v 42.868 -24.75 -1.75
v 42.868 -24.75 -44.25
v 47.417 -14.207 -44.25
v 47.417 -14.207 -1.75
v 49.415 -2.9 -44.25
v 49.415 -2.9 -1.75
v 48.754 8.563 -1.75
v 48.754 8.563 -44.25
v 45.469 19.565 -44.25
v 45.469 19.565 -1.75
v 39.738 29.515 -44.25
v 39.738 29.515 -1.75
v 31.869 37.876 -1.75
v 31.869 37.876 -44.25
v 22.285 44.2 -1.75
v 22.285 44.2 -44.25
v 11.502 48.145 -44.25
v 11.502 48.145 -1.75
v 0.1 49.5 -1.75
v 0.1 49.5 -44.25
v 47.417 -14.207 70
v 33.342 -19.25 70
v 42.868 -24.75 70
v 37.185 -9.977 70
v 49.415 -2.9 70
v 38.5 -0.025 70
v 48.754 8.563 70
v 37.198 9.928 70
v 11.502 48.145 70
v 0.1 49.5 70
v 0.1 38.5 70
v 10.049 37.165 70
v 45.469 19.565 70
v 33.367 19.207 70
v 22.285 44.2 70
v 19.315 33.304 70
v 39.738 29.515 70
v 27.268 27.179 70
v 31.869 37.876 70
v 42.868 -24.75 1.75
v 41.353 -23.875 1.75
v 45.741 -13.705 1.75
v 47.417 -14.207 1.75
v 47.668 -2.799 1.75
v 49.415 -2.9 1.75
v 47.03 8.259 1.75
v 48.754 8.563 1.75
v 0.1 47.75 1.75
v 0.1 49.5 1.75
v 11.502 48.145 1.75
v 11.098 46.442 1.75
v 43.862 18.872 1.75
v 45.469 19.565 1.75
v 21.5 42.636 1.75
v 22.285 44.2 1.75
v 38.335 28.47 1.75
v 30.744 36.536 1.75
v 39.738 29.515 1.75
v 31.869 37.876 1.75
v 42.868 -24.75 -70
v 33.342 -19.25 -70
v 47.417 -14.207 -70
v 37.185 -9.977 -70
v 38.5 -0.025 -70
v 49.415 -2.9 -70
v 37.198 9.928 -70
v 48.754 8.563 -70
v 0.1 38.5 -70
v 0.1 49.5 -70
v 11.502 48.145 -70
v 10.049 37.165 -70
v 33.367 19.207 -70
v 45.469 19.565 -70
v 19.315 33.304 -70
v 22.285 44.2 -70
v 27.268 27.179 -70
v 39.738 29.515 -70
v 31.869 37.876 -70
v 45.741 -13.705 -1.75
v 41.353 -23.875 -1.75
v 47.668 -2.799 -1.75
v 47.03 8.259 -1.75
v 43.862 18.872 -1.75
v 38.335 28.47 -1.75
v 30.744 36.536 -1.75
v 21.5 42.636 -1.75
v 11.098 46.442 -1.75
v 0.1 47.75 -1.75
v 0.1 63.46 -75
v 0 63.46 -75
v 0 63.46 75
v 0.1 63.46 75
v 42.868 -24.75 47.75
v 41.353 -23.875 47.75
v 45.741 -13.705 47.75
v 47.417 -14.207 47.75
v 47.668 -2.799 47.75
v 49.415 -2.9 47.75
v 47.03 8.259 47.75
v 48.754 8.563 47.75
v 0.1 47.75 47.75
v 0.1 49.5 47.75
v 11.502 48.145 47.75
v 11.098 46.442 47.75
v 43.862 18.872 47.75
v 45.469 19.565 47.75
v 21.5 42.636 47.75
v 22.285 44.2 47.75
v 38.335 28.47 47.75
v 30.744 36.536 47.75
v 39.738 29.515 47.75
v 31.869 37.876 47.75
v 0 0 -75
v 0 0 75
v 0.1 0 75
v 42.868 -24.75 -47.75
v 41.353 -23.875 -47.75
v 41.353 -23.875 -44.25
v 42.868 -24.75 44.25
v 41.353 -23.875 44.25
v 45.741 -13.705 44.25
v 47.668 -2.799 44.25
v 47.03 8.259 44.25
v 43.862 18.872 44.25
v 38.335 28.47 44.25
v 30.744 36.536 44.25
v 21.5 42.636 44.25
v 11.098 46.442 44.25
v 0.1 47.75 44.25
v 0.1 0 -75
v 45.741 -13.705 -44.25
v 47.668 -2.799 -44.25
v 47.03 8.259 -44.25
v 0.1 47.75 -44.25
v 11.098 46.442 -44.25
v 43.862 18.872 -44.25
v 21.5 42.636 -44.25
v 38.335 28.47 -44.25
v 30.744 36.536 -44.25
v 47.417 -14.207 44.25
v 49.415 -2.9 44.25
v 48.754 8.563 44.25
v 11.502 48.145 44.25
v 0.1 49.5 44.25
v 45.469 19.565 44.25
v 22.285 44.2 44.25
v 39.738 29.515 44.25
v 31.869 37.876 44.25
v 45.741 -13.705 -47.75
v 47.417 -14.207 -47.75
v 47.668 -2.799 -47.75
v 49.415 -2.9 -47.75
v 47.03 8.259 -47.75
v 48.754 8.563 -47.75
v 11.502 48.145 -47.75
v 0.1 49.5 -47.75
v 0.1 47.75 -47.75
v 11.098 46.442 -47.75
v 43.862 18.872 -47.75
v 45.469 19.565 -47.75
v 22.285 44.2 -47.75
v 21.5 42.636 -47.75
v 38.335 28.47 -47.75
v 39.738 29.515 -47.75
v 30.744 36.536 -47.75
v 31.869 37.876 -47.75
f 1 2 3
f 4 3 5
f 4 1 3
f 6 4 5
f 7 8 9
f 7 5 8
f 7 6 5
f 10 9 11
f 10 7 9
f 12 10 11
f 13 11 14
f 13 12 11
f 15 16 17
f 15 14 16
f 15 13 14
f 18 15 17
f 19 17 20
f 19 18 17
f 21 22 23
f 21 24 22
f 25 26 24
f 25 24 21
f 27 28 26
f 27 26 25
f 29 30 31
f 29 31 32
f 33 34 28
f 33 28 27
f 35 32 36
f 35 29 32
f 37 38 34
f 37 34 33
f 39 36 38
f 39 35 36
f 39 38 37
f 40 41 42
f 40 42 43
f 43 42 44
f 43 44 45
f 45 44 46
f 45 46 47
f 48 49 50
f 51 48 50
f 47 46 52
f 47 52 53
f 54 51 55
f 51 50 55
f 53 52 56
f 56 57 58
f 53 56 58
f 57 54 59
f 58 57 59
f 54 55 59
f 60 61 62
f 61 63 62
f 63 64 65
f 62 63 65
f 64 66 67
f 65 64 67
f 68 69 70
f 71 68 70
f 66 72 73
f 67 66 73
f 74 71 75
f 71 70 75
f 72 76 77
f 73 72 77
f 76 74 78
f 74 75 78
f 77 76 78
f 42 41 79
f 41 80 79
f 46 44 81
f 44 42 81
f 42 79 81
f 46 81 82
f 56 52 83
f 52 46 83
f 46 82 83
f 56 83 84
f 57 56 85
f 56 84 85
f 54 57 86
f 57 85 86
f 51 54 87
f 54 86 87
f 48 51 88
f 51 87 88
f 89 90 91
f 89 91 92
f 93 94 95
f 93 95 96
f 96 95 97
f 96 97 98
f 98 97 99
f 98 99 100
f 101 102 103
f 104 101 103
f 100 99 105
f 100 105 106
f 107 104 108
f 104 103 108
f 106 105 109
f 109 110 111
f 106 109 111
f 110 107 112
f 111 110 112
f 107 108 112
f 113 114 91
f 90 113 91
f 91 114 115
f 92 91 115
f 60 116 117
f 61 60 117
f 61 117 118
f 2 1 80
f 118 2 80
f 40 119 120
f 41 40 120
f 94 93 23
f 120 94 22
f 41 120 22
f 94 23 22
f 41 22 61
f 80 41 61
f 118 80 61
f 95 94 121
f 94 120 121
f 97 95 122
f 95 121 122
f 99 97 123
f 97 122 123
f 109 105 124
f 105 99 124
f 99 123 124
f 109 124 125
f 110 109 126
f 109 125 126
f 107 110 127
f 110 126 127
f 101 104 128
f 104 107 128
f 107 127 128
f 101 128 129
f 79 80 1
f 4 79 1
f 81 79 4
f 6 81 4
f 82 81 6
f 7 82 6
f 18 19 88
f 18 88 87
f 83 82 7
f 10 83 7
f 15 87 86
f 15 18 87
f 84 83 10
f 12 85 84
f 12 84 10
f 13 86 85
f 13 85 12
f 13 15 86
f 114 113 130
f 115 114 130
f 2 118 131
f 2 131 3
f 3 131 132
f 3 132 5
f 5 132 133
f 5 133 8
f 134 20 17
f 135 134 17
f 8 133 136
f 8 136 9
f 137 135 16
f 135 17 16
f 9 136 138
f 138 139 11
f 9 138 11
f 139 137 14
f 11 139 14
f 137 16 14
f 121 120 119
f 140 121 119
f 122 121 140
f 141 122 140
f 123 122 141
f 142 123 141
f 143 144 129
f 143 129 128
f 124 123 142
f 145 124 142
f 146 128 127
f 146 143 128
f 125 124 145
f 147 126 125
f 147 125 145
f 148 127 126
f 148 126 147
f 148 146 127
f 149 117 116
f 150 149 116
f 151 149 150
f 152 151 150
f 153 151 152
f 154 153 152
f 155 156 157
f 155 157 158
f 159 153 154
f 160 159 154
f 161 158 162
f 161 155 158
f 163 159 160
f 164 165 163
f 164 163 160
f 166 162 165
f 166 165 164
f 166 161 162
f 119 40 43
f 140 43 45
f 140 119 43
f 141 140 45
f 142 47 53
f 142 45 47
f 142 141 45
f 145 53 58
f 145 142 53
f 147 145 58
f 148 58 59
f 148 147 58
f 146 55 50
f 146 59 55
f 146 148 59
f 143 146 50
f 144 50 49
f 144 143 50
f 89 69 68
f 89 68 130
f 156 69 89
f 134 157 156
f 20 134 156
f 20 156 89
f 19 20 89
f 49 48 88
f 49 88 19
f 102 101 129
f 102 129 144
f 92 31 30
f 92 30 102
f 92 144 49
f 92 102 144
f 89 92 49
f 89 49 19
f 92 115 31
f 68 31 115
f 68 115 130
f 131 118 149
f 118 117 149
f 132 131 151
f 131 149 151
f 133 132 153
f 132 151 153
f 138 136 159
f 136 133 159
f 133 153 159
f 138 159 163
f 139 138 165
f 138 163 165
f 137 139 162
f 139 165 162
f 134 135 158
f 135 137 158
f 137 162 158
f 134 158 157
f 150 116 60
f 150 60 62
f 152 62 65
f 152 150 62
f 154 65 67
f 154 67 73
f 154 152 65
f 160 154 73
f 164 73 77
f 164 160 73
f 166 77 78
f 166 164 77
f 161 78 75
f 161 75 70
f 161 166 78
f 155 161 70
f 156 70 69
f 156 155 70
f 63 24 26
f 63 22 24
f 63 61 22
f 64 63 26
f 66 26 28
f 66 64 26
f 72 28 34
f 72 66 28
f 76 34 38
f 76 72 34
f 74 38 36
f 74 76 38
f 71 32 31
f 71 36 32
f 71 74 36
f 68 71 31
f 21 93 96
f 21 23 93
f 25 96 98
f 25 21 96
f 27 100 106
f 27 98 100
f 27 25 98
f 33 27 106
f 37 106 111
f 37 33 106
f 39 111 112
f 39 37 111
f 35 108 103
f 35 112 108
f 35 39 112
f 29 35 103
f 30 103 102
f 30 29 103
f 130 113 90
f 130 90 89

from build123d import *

# Parameters (mm, degrees)
F0_R       = 49.5
F0_R_2     = 38.5
F1_DEPTH   = 70
F2_R       = 54.3323959341
F2_R_2     = 47.75
F3_DEPTH   = 1.75
F6_R       = 54.3323959341
F6_R_2     = 47.75
F8_DEPTH   = 1.75
F7_R       = 54.3323959341
F7_R_2     = 47.75
F9_DEPTH   = 1.75
F10_W      = 0.1
F10_H      = 63.4597092867
F12_DEPTH  = 75
F12_FACE_W = 63.4597092867
F12_FACE_H = 150
F13_ANGLE  = 240
F14_DEPTH  = 150


with BuildPart() as f1:
    # F0 (on Top) → F1 (new body, symmetric)
    with BuildSketch(Plane.XY):
        Circle(F0_R)
        Circle(F0_R_2, mode=Mode.SUBTRACT)
    extrude(amount=F1_DEPTH, both=True)

    # F2 (on Top) → F3 (cut, symmetric)
    with BuildSketch(Plane.XY):
        Circle(F2_R)
        Circle(F2_R_2, mode=Mode.SUBTRACT)
    extrude(amount=F3_DEPTH, both=True, mode=Mode.SUBTRACT)

    # F6 (on offset) → F8 (cut, symmetric)
    with BuildSketch(Plane.XY.offset(46)):
        Circle(F6_R)
        Circle(F6_R_2, mode=Mode.SUBTRACT)
    extrude(amount=F8_DEPTH, both=True, mode=Mode.SUBTRACT)

    # F7 (on offset) → F9 (cut, symmetric)
    with BuildSketch(Plane.XY.offset(-46)):
        Circle(F7_R)
        Circle(F7_R_2, mode=Mode.SUBTRACT)
    extrude(amount=F9_DEPTH, both=True, mode=Mode.SUBTRACT)

    # F10 (on Top) → F12 (join, symmetric)
    with BuildSketch(Plane.XY):
        with Locations((0.05, 31.7298546433)):
            Rectangle(F10_W, F10_H)
    extrude(amount=F12_DEPTH, both=True)


with BuildPart() as f13:
    # F12_face (on face) → F13 (revolve)
    with BuildSketch(Plane(origin=(0, 29.4058824781, 0), x_dir=(0, -1, 0), z_dir=(-1, 0, 0))):
        with Locations((-2.3239721652, 0)):
            Rectangle(F12_FACE_W, F12_FACE_H)
        Polygon((-9.0941175219, -70), (-20.0941175219, -70), (-20.0941175219, -47.75), (-18.3441175219, -47.75), (-18.3441175219, -44.25), (-20.0941175219, -44.25), (-20.0941175219, -1.75), (-18.3441175219, -1.75), (-18.3441175219, 1.75), (-20.0941175219, 1.75), (-20.0941175219, 44.25), (-18.3441175219, 44.25), (-18.3441175219, 47.75), (-20.0941175219, 47.75), (-20.0941175219, 70), (-9.0941175219, 70), align=None, mode=Mode.SUBTRACT)
    revolve(axis=Axis((0, 0, -0.0270418823), (0, 0, 1)), revolution_arc=F13_ANGLE)


with BuildPart() as f14_tool:
    # F14 (cut): a face of the model
    f14_faces = [f13.part.faces().sort_by_distance(p)[0] for p in [
        (-15.1498896302, -8.7467928562, 75),
    ]]
    extrude(f14_faces, amount=-F14_DEPTH)


with BuildPart() as f1_1:
    add(f1.part)

    # F14: cut by f14_tool
    add(f14_tool.part, mode=Mode.SUBTRACT)


with BuildPart() as f13_1:
    add(f13.part)

    # F14: cut by f14_tool
    add(f14_tool.part, mode=Mode.SUBTRACT)


solid = f1_1.part
